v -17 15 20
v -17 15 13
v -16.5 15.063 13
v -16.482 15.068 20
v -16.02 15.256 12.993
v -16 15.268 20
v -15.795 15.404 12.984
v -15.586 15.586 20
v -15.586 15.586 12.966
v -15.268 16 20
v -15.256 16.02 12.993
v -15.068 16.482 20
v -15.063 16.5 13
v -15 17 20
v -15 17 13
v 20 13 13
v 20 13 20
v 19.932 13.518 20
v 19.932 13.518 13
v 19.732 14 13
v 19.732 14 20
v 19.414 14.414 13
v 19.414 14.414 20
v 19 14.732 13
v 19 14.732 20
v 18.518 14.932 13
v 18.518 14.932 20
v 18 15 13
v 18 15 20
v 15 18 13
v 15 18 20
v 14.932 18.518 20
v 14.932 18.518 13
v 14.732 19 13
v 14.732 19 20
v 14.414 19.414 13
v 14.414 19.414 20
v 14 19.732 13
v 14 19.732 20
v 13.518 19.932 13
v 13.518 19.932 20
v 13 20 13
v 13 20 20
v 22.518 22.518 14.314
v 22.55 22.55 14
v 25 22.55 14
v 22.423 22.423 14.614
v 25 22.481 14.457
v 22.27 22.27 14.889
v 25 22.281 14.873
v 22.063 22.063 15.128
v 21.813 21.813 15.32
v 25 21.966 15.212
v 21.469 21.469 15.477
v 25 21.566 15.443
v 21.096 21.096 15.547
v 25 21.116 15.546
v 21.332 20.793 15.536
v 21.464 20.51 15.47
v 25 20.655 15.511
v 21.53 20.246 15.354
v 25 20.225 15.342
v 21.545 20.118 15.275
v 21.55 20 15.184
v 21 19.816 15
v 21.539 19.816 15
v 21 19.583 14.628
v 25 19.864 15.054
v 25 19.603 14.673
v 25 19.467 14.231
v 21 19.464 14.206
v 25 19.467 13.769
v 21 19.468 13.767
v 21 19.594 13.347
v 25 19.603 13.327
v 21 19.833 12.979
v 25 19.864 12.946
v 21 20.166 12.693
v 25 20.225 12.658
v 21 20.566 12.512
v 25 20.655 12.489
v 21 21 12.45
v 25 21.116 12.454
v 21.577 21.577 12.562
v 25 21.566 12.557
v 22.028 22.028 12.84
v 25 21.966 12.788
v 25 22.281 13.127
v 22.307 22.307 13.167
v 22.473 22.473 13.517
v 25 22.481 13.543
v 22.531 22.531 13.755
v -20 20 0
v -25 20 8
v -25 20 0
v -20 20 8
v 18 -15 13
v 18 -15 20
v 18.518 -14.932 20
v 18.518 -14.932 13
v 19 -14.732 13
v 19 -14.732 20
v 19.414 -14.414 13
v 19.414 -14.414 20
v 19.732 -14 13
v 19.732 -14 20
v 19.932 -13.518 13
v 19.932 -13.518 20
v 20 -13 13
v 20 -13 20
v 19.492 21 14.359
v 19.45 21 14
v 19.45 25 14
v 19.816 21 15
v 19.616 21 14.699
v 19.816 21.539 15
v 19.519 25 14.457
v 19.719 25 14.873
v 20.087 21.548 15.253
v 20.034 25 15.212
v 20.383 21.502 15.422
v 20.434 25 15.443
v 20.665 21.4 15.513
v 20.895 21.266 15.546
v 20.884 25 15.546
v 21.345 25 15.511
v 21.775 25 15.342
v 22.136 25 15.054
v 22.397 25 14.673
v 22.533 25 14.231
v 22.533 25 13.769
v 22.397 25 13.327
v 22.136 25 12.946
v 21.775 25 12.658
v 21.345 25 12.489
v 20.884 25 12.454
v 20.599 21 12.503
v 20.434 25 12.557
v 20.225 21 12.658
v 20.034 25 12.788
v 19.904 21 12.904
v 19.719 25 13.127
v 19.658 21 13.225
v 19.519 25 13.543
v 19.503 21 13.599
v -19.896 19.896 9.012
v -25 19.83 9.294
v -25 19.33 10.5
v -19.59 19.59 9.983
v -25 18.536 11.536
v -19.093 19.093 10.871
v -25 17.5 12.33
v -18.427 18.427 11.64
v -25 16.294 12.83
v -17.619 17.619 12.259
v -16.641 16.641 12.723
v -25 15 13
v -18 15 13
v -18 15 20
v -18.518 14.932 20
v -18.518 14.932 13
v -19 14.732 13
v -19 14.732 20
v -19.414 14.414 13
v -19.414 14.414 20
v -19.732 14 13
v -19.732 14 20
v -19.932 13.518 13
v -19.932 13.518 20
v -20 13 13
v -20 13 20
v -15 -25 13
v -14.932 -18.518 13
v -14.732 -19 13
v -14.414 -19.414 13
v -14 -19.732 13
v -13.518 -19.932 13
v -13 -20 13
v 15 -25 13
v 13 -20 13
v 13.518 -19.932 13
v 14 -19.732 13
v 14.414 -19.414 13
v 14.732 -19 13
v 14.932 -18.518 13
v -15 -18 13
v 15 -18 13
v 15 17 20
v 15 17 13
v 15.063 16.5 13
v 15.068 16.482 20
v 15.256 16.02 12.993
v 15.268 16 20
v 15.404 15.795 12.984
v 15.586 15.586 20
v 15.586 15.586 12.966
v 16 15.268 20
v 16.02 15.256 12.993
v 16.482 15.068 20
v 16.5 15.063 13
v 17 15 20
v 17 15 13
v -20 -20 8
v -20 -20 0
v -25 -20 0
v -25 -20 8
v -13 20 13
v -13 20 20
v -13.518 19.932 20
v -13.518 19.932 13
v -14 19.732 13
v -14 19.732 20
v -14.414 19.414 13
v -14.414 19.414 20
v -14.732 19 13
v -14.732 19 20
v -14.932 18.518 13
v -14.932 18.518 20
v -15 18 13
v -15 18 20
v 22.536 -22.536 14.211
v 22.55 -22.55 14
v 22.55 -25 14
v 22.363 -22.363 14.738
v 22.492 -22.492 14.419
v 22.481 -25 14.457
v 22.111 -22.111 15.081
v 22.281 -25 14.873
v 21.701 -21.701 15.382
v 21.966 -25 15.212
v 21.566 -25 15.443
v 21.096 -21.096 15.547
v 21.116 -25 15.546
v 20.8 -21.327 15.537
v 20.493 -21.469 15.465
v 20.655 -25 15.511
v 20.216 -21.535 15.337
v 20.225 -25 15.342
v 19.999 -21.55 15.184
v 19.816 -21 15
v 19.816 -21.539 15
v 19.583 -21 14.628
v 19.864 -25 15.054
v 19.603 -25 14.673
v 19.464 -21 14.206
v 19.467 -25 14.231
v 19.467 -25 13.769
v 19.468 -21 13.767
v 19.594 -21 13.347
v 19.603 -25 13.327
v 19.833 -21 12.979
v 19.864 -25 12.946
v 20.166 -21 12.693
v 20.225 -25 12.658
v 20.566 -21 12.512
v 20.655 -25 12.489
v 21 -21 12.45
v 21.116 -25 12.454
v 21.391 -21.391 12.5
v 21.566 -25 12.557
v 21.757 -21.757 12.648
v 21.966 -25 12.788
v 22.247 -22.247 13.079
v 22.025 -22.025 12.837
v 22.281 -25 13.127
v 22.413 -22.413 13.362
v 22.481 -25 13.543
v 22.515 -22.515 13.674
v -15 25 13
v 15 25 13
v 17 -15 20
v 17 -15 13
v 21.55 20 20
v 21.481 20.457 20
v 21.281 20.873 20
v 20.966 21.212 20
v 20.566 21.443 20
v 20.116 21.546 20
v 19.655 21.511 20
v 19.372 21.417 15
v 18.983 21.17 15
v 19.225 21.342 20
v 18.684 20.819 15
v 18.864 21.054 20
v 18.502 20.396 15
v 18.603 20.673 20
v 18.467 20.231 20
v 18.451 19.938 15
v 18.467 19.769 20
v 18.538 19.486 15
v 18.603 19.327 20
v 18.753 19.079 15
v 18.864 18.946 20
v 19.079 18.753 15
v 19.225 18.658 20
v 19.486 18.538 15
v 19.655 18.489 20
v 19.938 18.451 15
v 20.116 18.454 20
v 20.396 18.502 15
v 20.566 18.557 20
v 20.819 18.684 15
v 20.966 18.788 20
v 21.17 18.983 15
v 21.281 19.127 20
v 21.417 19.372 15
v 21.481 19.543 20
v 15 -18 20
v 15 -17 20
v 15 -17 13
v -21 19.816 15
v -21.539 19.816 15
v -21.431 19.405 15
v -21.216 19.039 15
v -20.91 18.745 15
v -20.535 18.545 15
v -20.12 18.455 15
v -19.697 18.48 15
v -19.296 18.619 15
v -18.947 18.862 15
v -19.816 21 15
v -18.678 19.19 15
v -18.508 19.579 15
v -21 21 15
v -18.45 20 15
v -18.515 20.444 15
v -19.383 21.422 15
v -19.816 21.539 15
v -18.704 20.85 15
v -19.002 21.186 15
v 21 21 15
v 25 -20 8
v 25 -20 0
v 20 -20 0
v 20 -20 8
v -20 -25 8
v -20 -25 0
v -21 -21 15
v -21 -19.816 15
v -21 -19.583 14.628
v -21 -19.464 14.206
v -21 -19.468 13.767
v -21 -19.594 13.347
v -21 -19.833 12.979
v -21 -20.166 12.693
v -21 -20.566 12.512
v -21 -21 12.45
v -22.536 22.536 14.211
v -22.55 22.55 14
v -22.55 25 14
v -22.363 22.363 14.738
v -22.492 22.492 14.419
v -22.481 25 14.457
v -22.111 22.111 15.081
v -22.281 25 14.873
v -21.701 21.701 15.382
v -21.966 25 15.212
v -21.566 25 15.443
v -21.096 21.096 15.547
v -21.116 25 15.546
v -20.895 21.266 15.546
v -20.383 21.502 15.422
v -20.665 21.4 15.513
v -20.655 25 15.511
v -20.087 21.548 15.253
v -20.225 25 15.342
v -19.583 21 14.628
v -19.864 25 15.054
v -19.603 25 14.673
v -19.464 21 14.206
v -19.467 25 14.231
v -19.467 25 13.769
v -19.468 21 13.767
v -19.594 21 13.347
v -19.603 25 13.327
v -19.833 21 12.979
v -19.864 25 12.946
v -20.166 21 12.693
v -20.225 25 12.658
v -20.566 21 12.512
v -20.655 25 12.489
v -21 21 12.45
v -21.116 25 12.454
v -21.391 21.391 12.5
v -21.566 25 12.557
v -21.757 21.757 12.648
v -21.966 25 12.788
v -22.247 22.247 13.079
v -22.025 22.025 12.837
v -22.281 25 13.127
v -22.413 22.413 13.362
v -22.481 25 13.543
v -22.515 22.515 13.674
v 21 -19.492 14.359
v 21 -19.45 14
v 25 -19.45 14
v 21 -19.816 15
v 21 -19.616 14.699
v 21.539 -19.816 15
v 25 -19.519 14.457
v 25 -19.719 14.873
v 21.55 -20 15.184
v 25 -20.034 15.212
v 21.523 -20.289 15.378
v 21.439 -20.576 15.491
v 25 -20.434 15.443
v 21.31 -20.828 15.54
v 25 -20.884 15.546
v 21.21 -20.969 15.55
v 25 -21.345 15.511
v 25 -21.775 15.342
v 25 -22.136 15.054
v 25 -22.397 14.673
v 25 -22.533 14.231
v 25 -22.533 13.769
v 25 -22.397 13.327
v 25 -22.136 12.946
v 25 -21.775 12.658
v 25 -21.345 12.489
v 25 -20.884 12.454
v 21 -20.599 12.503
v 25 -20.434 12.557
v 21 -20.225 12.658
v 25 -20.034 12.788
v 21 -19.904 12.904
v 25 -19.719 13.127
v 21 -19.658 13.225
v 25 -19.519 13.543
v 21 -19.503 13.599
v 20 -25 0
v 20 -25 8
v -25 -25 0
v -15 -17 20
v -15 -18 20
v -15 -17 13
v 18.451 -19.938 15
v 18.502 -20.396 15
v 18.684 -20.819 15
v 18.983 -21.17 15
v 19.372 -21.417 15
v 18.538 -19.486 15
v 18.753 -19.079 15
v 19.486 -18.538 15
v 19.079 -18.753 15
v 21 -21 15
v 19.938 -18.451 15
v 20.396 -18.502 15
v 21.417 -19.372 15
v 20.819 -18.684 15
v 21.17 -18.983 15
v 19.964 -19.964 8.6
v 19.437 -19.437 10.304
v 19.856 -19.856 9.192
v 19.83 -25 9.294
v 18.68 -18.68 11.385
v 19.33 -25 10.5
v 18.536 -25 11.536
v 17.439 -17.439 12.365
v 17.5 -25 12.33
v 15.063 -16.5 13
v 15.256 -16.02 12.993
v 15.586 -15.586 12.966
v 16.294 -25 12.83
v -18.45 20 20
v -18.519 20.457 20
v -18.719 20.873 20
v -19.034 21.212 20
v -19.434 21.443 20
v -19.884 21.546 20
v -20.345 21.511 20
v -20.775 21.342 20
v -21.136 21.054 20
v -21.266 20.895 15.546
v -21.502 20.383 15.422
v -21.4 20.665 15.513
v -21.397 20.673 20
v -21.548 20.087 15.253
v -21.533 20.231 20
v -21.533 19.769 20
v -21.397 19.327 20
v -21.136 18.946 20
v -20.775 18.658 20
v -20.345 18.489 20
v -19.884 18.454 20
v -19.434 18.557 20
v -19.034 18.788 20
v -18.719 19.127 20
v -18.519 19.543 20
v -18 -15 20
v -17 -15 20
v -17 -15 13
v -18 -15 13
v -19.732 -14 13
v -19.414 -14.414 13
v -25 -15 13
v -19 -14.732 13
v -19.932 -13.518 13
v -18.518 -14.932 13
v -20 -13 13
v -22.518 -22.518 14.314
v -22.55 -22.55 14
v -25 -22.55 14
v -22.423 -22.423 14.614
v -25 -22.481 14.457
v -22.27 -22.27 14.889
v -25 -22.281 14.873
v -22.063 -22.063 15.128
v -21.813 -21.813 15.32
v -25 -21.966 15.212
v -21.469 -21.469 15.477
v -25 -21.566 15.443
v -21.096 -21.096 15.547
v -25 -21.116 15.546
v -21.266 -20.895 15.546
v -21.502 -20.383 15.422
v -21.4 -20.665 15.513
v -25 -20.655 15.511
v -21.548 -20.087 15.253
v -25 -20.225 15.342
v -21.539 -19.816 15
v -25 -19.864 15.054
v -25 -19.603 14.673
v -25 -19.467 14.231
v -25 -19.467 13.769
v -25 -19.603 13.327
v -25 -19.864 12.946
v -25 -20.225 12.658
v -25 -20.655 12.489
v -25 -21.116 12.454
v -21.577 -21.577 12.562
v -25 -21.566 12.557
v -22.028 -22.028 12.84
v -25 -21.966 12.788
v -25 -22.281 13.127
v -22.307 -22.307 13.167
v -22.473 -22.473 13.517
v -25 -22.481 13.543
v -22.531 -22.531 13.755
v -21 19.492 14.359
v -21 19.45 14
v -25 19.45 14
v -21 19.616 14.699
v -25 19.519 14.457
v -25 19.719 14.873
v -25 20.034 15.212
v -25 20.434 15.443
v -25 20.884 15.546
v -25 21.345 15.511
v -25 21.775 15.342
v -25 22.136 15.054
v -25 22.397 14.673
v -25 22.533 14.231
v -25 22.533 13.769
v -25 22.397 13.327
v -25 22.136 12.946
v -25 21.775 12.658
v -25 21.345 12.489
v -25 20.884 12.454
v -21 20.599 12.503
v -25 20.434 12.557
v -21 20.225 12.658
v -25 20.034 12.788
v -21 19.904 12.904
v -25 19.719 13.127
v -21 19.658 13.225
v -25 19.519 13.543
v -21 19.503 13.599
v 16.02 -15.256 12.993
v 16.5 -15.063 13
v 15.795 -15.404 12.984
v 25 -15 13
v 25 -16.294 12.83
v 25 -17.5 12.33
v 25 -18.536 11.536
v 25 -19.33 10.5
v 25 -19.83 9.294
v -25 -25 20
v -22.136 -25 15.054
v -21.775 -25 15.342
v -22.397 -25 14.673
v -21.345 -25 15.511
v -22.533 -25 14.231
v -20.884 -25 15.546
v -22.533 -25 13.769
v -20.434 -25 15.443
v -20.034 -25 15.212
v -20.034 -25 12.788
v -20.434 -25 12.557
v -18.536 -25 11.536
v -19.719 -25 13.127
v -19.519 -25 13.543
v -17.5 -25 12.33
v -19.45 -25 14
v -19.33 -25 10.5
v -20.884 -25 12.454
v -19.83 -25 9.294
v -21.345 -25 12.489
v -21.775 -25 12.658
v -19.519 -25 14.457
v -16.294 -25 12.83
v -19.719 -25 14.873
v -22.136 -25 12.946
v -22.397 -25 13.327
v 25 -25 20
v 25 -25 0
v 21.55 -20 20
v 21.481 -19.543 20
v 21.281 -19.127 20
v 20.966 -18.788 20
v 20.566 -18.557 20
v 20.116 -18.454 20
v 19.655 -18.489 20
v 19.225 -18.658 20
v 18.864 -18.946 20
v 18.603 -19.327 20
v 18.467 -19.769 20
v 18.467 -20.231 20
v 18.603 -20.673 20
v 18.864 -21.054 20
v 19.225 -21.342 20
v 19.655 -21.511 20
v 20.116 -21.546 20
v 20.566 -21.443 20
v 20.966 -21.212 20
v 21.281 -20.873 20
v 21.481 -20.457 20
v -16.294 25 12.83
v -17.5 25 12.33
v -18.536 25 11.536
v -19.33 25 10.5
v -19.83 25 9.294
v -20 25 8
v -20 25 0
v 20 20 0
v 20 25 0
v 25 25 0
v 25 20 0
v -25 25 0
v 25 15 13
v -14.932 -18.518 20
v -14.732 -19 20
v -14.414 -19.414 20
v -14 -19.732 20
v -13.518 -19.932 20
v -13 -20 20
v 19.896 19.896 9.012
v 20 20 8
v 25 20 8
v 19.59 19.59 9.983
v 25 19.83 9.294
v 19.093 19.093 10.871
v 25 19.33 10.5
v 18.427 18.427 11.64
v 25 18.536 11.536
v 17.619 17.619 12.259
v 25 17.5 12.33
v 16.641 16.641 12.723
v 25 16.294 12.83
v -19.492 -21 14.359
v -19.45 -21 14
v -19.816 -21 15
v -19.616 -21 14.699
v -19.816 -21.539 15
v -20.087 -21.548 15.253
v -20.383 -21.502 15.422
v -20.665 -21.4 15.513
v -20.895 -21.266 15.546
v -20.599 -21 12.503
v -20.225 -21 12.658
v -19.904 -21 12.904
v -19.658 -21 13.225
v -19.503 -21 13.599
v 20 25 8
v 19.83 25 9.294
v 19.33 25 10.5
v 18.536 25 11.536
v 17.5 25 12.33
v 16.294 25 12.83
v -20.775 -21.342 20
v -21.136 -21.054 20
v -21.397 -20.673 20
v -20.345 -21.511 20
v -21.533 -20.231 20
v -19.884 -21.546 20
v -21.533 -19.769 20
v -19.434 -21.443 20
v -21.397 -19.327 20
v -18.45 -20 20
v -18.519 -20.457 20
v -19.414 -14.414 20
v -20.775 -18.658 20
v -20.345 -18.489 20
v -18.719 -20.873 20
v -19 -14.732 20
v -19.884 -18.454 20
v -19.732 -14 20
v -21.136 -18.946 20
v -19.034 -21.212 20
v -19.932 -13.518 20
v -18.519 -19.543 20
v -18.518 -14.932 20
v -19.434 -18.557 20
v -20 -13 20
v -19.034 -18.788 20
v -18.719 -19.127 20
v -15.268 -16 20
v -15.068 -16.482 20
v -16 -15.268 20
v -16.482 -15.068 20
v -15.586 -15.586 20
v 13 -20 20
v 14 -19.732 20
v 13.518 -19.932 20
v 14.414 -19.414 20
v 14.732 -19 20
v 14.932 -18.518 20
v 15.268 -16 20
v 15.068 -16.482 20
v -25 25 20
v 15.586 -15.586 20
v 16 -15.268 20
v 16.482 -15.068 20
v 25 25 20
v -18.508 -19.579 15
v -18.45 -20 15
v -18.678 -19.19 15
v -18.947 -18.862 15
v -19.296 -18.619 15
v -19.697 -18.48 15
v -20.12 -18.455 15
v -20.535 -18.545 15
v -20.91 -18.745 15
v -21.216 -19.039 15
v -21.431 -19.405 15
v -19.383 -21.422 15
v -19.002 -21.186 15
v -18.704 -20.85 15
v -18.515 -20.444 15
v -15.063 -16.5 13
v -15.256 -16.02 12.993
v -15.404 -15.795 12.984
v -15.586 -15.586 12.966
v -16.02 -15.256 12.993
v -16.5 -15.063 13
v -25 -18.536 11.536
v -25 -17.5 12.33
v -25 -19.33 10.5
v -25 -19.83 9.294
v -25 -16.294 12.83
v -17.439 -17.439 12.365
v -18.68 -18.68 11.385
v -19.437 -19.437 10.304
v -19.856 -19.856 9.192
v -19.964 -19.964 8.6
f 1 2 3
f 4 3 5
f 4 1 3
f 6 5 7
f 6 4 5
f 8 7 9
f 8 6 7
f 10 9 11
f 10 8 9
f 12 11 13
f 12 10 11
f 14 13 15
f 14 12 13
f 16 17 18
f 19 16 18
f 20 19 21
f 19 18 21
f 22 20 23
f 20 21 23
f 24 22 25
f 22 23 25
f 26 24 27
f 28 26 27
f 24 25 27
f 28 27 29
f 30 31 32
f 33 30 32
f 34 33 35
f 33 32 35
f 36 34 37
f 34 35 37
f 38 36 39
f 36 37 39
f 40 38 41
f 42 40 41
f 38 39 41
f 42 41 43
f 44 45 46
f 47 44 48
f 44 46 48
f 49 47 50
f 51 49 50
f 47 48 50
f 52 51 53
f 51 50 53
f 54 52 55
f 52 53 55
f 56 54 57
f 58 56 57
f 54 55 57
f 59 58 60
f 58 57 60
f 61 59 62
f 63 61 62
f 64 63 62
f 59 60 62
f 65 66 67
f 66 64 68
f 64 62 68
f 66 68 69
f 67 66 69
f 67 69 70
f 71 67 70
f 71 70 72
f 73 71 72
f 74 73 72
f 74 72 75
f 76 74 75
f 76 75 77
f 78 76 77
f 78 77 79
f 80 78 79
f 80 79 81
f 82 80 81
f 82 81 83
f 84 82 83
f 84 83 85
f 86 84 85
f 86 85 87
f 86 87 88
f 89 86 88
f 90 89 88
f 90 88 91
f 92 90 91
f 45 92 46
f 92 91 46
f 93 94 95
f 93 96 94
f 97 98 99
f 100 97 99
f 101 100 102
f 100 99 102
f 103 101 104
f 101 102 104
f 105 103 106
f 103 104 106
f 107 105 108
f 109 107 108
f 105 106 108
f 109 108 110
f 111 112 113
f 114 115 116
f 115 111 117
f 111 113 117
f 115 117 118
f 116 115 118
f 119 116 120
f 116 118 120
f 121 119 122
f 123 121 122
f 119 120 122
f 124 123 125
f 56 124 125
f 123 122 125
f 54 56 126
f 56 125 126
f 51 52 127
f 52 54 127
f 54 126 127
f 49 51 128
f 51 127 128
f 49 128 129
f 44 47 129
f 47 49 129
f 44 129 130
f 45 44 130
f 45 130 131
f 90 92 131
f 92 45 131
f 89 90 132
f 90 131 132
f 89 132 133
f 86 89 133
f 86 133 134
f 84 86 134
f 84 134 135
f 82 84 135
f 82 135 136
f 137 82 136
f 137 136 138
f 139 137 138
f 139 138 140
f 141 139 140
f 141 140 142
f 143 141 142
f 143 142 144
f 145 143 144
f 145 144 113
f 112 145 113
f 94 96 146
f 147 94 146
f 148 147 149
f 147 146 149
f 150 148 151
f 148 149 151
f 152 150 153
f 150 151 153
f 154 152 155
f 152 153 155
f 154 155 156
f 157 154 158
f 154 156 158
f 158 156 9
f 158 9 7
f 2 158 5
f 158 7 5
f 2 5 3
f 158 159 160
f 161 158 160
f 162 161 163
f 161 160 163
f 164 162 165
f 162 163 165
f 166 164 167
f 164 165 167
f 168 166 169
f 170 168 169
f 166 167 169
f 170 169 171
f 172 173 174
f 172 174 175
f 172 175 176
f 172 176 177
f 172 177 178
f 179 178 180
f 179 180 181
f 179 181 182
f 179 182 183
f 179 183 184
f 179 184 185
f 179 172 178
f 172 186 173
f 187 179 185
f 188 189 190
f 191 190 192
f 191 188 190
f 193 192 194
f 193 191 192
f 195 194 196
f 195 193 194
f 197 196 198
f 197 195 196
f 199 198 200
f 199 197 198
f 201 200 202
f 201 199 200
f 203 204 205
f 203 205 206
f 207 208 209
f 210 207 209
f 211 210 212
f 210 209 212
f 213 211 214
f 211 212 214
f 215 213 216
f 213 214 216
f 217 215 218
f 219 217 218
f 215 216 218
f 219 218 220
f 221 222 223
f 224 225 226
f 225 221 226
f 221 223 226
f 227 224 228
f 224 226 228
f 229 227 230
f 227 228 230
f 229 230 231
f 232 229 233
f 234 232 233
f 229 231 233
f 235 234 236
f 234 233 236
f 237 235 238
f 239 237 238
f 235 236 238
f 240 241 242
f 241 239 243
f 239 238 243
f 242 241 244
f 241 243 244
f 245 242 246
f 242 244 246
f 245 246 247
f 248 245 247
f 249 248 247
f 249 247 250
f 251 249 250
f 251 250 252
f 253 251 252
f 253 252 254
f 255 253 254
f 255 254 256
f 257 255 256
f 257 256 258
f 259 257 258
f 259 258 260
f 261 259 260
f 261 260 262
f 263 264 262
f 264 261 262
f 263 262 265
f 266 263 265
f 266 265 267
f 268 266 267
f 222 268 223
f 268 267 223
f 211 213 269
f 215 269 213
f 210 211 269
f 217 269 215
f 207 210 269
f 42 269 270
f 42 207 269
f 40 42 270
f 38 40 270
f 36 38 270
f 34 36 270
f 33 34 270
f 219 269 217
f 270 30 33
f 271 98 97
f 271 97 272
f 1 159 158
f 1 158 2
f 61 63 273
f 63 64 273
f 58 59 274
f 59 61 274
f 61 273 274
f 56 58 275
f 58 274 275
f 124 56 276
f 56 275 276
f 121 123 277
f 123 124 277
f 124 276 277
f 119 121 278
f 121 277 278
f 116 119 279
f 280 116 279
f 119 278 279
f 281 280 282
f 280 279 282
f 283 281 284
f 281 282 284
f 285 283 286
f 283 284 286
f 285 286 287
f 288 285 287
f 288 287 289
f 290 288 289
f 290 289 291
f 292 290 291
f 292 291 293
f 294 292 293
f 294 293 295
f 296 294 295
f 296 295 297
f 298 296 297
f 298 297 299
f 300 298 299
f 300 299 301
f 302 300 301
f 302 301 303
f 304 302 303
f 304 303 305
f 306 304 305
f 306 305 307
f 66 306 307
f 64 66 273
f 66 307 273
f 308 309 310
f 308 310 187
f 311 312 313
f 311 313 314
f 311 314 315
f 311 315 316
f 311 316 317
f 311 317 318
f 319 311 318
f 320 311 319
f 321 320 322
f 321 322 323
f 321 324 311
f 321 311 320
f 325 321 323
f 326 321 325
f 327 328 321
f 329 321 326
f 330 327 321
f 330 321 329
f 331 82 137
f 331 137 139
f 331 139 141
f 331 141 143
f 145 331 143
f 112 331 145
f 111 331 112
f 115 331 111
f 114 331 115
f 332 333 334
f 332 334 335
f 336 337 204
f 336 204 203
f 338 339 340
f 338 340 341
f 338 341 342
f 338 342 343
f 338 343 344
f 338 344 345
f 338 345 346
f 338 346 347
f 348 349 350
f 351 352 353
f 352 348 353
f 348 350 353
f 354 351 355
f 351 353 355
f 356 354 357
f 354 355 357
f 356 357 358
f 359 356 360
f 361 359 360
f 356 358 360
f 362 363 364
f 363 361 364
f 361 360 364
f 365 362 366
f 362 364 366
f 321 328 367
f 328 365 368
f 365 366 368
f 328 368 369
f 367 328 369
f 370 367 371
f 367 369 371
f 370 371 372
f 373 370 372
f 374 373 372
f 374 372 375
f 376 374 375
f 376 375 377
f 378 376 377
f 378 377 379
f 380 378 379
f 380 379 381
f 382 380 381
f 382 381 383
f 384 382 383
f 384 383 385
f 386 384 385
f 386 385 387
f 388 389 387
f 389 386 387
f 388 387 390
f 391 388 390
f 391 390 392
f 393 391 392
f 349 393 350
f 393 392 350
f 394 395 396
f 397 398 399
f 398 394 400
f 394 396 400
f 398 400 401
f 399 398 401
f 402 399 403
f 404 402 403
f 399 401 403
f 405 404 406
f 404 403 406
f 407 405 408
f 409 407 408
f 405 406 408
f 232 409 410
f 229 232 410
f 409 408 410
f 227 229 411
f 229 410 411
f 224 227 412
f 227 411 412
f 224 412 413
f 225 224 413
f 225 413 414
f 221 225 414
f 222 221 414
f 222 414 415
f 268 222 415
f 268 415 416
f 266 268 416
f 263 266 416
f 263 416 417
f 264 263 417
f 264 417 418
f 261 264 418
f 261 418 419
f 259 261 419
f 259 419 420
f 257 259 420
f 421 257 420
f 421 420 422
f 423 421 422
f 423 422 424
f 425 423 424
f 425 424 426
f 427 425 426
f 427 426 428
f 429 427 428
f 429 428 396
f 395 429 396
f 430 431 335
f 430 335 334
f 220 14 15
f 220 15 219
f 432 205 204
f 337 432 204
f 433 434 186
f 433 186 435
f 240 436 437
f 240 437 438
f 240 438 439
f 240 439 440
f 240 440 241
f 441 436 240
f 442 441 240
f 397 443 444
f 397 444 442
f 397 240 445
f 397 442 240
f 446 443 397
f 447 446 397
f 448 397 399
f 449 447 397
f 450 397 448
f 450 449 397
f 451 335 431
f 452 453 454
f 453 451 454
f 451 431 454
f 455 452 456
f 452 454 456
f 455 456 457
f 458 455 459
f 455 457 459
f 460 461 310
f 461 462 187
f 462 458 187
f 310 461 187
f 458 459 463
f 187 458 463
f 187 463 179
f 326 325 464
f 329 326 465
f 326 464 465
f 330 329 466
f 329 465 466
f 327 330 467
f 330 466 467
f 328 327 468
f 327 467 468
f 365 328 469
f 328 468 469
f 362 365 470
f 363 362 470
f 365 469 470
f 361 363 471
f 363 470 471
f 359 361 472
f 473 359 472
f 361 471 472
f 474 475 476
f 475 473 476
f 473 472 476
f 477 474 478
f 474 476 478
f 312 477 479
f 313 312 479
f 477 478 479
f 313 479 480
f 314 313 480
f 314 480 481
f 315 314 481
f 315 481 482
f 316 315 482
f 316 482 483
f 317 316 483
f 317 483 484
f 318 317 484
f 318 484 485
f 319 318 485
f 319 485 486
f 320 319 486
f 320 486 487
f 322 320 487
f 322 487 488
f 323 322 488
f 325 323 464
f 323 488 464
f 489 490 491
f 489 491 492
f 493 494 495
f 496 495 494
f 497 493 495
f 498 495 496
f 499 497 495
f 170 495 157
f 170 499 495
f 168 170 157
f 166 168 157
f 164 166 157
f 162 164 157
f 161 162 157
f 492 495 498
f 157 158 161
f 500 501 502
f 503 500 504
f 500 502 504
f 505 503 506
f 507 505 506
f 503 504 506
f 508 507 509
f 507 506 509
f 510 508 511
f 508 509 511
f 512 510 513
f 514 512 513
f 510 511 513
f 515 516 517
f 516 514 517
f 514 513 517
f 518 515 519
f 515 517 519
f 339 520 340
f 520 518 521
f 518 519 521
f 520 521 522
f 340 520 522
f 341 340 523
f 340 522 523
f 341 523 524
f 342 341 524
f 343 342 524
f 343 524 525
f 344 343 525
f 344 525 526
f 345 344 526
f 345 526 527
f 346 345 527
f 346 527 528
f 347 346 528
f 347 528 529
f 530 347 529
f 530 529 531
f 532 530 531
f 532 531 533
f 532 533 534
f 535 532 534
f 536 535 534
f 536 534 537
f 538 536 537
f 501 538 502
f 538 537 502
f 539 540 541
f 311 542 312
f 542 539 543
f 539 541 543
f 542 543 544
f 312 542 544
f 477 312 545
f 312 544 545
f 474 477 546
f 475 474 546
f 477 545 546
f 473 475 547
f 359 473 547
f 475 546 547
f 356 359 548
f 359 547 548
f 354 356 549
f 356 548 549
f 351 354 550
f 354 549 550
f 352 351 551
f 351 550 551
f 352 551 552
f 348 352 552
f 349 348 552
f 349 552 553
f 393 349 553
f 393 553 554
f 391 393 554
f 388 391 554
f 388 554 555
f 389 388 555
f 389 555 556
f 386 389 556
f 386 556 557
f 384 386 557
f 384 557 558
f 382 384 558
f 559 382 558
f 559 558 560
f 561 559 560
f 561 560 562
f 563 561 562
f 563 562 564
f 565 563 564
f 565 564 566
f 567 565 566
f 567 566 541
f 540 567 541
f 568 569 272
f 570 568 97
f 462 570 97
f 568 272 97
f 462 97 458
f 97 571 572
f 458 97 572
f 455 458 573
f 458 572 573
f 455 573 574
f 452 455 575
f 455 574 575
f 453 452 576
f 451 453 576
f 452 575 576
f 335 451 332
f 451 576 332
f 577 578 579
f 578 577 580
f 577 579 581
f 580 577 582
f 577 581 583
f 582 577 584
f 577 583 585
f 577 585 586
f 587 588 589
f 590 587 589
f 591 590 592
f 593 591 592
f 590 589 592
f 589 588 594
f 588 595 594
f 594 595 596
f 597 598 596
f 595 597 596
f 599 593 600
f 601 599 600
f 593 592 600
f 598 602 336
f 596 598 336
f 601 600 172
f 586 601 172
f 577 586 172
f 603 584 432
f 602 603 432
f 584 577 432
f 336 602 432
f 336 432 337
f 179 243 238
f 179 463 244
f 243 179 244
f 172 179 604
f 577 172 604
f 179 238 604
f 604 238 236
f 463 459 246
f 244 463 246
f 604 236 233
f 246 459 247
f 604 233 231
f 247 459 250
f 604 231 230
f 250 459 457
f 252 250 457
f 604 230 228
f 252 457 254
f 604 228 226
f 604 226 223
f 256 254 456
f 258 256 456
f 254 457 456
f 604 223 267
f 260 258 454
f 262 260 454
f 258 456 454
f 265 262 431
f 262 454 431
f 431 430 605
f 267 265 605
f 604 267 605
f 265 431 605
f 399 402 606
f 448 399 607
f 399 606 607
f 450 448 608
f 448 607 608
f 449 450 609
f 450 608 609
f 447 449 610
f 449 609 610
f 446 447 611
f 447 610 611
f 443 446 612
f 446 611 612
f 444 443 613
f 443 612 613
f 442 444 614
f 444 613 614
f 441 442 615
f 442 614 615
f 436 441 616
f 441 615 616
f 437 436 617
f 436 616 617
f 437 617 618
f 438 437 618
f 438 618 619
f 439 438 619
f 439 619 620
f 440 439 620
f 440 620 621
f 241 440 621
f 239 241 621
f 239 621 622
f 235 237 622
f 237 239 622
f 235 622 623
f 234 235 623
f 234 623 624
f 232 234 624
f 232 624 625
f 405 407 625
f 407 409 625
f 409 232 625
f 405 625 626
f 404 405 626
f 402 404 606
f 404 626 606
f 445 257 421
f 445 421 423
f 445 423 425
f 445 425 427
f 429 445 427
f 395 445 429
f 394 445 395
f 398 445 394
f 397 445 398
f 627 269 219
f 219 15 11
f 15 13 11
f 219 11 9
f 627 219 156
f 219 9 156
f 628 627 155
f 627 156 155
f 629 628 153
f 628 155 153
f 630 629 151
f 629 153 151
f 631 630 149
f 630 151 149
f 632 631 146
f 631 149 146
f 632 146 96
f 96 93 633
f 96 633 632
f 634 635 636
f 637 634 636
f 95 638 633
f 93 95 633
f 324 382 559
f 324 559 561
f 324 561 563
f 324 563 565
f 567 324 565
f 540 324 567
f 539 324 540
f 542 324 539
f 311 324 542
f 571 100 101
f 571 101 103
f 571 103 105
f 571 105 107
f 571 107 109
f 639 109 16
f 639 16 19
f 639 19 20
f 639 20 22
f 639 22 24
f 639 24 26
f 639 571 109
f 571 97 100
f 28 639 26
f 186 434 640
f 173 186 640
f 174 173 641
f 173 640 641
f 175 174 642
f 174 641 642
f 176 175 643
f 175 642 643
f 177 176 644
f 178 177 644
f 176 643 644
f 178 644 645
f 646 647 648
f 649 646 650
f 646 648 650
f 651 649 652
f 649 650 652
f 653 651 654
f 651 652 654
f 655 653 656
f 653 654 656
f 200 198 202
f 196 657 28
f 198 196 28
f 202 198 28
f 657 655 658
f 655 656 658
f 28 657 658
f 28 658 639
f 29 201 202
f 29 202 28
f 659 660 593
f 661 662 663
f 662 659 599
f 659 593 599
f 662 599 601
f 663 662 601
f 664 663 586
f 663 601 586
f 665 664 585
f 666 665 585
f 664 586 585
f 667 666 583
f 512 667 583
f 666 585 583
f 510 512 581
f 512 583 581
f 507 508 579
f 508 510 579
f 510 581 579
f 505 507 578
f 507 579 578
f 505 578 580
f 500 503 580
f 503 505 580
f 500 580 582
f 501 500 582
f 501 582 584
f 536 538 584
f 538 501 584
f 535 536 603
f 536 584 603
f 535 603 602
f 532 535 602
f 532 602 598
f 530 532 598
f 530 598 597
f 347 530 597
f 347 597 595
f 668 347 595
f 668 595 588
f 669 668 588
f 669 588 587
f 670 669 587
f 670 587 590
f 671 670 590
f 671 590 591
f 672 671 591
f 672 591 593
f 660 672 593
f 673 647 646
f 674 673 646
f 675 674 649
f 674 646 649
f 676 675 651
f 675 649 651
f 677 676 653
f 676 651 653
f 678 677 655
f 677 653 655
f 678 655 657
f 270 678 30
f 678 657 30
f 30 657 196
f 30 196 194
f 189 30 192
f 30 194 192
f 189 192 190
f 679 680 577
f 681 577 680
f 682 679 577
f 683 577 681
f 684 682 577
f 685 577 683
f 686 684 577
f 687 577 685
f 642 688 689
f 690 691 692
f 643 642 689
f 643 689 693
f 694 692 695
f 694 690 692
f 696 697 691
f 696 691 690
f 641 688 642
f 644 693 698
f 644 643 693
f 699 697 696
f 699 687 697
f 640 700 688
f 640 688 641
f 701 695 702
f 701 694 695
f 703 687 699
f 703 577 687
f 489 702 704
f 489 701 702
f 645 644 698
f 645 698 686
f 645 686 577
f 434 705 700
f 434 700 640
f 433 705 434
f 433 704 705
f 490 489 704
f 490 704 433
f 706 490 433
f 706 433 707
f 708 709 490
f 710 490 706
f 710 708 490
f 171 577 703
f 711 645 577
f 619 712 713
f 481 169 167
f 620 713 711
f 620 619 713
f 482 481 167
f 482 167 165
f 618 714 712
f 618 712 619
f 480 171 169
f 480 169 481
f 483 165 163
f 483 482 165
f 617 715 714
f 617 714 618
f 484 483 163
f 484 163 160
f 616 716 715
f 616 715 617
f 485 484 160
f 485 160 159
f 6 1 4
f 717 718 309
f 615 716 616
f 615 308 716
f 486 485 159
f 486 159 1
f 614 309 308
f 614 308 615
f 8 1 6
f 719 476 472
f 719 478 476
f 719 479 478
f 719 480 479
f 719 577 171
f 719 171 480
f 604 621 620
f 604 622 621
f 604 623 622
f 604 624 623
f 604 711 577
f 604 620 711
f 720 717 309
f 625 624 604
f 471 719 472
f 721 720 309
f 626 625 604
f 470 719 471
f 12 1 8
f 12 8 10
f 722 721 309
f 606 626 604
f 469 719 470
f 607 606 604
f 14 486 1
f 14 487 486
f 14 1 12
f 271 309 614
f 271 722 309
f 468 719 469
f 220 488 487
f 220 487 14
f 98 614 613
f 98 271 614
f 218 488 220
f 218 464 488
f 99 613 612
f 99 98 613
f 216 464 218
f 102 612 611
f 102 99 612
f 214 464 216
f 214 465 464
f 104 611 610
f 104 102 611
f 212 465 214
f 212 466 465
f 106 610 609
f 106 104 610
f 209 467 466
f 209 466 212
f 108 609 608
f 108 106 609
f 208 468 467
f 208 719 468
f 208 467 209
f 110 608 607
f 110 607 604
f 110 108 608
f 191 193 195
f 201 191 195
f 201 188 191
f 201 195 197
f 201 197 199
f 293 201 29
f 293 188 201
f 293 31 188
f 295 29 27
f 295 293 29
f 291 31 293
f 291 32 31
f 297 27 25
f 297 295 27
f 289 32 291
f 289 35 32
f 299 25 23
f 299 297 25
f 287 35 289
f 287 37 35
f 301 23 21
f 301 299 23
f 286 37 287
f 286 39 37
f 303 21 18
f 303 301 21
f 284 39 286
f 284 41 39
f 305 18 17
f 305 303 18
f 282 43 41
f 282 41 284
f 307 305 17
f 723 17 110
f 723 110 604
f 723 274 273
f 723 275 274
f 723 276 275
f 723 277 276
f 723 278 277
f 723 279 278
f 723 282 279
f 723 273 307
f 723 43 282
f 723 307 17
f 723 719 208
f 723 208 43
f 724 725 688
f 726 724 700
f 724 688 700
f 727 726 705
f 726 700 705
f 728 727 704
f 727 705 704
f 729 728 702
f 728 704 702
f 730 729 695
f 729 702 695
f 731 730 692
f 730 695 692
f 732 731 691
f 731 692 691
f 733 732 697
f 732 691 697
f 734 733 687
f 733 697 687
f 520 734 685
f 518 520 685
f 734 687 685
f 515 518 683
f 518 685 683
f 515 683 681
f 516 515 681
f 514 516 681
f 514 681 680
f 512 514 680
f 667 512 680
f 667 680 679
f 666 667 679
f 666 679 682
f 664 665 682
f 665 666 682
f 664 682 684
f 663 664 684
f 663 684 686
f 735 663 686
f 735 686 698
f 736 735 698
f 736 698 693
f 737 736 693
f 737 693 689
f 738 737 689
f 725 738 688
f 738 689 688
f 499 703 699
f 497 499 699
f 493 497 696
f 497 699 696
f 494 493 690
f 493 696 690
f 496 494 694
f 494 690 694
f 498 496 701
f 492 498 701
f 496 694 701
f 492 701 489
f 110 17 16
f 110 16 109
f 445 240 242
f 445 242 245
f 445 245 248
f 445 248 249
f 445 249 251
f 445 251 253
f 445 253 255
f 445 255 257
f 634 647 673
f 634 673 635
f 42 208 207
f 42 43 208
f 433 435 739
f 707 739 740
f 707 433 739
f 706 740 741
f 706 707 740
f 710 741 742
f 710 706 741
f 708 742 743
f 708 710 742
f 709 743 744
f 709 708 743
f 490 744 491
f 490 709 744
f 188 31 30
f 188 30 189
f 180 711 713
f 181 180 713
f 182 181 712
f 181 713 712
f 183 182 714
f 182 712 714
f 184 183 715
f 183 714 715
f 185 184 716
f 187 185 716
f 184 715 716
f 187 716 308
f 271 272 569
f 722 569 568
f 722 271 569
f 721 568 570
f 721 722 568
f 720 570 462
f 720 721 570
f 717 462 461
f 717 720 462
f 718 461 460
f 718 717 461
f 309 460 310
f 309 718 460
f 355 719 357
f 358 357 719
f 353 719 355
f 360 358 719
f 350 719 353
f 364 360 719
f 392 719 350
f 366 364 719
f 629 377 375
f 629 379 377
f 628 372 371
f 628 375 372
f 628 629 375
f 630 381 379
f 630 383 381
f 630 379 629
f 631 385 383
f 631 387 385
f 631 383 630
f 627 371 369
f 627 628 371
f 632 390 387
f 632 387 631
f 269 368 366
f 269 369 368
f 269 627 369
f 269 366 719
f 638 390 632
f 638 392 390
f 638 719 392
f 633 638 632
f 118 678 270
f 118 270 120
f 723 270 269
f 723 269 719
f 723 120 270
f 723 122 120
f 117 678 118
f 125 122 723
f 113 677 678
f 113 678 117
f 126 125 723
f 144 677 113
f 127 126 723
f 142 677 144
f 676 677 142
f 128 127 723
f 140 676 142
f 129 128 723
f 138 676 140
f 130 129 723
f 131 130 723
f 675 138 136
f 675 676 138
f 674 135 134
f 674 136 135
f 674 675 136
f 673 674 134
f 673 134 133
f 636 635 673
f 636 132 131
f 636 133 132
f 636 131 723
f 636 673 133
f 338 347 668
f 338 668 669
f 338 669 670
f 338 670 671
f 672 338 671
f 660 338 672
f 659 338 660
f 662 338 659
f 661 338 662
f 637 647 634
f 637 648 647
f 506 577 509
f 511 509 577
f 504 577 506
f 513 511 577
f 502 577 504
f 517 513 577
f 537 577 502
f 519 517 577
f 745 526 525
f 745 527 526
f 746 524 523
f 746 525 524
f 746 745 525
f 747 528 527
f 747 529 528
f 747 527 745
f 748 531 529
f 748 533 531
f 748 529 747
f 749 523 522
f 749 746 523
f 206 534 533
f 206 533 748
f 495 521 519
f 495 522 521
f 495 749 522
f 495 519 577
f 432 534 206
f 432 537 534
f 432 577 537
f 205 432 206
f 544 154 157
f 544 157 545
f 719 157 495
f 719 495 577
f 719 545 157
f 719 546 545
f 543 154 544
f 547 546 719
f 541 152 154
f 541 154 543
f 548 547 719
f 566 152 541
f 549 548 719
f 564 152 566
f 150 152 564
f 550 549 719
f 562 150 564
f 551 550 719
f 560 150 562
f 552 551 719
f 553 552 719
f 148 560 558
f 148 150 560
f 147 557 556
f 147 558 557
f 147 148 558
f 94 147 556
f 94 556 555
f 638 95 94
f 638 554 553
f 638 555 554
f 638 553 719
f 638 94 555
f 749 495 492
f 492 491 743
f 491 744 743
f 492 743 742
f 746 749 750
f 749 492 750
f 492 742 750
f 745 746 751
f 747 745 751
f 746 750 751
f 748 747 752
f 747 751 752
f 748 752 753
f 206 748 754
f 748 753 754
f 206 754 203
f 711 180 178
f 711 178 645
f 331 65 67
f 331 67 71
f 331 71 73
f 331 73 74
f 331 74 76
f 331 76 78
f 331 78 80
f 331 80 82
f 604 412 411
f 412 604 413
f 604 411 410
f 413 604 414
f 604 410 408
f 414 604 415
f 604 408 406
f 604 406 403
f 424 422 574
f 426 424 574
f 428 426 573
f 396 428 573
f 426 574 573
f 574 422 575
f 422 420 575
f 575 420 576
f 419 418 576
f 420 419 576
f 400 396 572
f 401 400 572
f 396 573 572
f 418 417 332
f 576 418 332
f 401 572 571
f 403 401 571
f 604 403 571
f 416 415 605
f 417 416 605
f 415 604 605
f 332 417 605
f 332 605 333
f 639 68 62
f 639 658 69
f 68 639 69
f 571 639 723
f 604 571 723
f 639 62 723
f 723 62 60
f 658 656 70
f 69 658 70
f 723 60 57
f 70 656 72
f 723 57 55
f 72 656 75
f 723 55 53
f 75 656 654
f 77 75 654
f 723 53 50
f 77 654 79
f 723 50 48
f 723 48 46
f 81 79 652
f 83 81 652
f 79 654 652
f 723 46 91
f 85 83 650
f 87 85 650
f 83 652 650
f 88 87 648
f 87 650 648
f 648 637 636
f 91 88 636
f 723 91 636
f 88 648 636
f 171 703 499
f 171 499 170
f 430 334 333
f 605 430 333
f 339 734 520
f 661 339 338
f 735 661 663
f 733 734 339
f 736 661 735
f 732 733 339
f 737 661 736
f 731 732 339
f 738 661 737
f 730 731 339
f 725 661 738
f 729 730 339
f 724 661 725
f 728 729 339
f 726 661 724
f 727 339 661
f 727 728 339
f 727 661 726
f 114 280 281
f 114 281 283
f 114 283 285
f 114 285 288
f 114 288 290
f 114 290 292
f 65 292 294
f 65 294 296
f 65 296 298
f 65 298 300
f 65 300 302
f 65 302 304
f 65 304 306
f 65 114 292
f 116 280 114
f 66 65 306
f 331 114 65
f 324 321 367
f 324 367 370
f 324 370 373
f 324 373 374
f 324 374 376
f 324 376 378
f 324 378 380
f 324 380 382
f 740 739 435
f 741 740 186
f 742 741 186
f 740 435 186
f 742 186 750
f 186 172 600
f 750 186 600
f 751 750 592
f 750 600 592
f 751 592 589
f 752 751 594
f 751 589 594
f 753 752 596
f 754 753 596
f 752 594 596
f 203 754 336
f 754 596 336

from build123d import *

# Parameters (mm, degrees)
SKETCH_W        = 50
SKETCH_H        = 50
PAD_DEPTH       = 20
POCKET_DEPTH    = 20.001
POCKET001_DEPTH = 50.001
POCKET002_DEPTH = 50.001
SKETCH004_R     = 1.55
POCKET003_DEPTH = 4
SKETCH006_R     = 1.55
POCKET005_DEPTH = 4
SKETCH007_R     = 1.55
POCKET006_DEPTH = 4
SKETCH008_R     = 1.55
POCKET007_DEPTH = 4
SKETCH009_R     = 1.55
POCKET008_DEPTH = 5


with BuildPart() as part:
    # Sketch → Pad (new body)
    with BuildSketch(Plane.XY):
        Rectangle(SKETCH_W, SKETCH_H)
    extrude(amount=PAD_DEPTH)

    # Sketch001 (on Face6 of Pad) → Pocket (cut, through all)
    with BuildSketch(Plane.XY.offset(20)):
        with BuildLine():
            Line((-18, 15), (-17, 15))
            ThreePointArc((-17, 15), (-15.585786, 15.585786), (-15, 17))
            Line((-15, 17), (-15, 18))
            ThreePointArc((-13, 20), (-14.414214, 19.414214), (-15, 18))
            Line((-13, 20), (13, 20))
            ThreePointArc((15, 18), (14.414214, 19.414214), (13, 20))
            Line((15, 18), (15, 17))
            ThreePointArc((15, 17), (15.585786, 15.585786), (17, 15))
            Line((17, 15), (18, 15))
            ThreePointArc((20, 13), (19.414214, 14.414214), (18, 15))
            Line((20, 13), (20, -13))
            ThreePointArc((18, -15), (19.414214, -14.414214), (20, -13))
            Line((18, -15), (17, -15))
            ThreePointArc((17, -15), (15.585786, -15.585786), (15, -17))
            Line((15, -17), (15, -18))
            ThreePointArc((13, -20), (14.414214, -19.414214), (15, -18))
            Line((13, -20), (-13, -20))
            ThreePointArc((-15, -18), (-14.414214, -19.414214), (-13, -20))
            Line((-15, -18), (-15, -17))
            ThreePointArc((-15, -17), (-15.585786, -15.585786), (-17, -15))
            Line((-17, -15), (-18, -15))
            ThreePointArc((-20, -13), (-19.414214, -14.414214), (-18, -15))
            Line((-20, -13), (-20, 13))
            ThreePointArc((-18, 15), (-19.414214, 14.414214), (-20, 13))
        make_face()
    extrude(amount=-POCKET_DEPTH, mode=Mode.SUBTRACT)

    # Sketch002 (on Face3 of Pocket) → Pocket001 (cut, through all)
    with BuildSketch(Plane.YZ.offset(25)):
        with BuildLine():
            Line((-15, 13), (15, 13))
            ThreePointArc((20, 8), (18.535534, 11.535534), (15, 13))
            Line((20, 8), (20, 0))
            Line((20, 0), (-20, 0))
            Line((-20, 0), (-20, 8))
            ThreePointArc((-15, 13), (-18.535534, 11.535534), (-20, 8))
        make_face()
    extrude(amount=-POCKET001_DEPTH, mode=Mode.SUBTRACT)

    # Sketch003 (on Face6 of Pocket) → Pocket002 (cut, through all)
    with BuildSketch(Plane.XZ.offset(25)):
        with BuildLine():
            Line((-15, 13), (15, 13))
            ThreePointArc((20, 8), (18.535534, 11.535534), (15, 13))
            Line((20, 8), (20, 0))
            Line((20, 0), (-20, 0))
            Line((-20, 0), (-20, 8))
            ThreePointArc((-15, 13), (-18.535534, 11.535534), (-20, 8))
        make_face()
    extrude(amount=-POCKET002_DEPTH, mode=Mode.SUBTRACT)

    # Sketch004 (on Face11 of Pocket002) → Pocket003 (cut)
    with BuildSketch(Plane(origin=(-25, 0, 0), x_dir=(0, -1, 0), z_dir=(-1, 0, 0))):
        with Locations((-21, 14)):
            Circle(SKETCH004_R)
        with Locations((21, 14)):
            Circle(SKETCH004_R)
    extrude(amount=-POCKET003_DEPTH, mode=Mode.SUBTRACT)

    # Sketch006 → Pocket005 (cut)
    with BuildSketch(Plane.YZ.offset(25)):
        with Locations((-21, 14)):
            Circle(SKETCH006_R)
        with Locations((21, 14)):
            Circle(SKETCH006_R)
    extrude(amount=-POCKET005_DEPTH, mode=Mode.SUBTRACT)

    # Sketch007 (on Face1 of Pocket005) → Pocket006 (cut)
    with BuildSketch(Plane(origin=(0, 25, 0), x_dir=(-1, 0, 0), z_dir=(0, 1, 0))):
        with Locations((-21, 14)):
            Circle(SKETCH007_R)
        with Locations((21, 14)):
            Circle(SKETCH007_R)
    extrude(amount=-POCKET006_DEPTH, mode=Mode.SUBTRACT)

    # Sketch008 (on Face16 of Pocket006) → Pocket007 (cut)
    with BuildSketch(Plane.XZ.offset(25)):
        with Locations((-21, 14)):
            Circle(SKETCH008_R)
        with Locations((21, 14)):
            Circle(SKETCH008_R)
    extrude(amount=-POCKET007_DEPTH, mode=Mode.SUBTRACT)

    # Sketch009 (on Face5 of Pocket007) → Pocket008 (cut)
    with BuildSketch(Plane.XY.offset(20)):
        with Locations((-20, 20)):
            Circle(SKETCH009_R)
        with Locations((20, 20)):
            Circle(SKETCH009_R)
        with Locations((20, -20)):
            Circle(SKETCH009_R)
        with Locations((-20, -20)):
            Circle(SKETCH009_R)
    extrude(amount=-POCKET008_DEPTH, mode=Mode.SUBTRACT)


solid = part.part
